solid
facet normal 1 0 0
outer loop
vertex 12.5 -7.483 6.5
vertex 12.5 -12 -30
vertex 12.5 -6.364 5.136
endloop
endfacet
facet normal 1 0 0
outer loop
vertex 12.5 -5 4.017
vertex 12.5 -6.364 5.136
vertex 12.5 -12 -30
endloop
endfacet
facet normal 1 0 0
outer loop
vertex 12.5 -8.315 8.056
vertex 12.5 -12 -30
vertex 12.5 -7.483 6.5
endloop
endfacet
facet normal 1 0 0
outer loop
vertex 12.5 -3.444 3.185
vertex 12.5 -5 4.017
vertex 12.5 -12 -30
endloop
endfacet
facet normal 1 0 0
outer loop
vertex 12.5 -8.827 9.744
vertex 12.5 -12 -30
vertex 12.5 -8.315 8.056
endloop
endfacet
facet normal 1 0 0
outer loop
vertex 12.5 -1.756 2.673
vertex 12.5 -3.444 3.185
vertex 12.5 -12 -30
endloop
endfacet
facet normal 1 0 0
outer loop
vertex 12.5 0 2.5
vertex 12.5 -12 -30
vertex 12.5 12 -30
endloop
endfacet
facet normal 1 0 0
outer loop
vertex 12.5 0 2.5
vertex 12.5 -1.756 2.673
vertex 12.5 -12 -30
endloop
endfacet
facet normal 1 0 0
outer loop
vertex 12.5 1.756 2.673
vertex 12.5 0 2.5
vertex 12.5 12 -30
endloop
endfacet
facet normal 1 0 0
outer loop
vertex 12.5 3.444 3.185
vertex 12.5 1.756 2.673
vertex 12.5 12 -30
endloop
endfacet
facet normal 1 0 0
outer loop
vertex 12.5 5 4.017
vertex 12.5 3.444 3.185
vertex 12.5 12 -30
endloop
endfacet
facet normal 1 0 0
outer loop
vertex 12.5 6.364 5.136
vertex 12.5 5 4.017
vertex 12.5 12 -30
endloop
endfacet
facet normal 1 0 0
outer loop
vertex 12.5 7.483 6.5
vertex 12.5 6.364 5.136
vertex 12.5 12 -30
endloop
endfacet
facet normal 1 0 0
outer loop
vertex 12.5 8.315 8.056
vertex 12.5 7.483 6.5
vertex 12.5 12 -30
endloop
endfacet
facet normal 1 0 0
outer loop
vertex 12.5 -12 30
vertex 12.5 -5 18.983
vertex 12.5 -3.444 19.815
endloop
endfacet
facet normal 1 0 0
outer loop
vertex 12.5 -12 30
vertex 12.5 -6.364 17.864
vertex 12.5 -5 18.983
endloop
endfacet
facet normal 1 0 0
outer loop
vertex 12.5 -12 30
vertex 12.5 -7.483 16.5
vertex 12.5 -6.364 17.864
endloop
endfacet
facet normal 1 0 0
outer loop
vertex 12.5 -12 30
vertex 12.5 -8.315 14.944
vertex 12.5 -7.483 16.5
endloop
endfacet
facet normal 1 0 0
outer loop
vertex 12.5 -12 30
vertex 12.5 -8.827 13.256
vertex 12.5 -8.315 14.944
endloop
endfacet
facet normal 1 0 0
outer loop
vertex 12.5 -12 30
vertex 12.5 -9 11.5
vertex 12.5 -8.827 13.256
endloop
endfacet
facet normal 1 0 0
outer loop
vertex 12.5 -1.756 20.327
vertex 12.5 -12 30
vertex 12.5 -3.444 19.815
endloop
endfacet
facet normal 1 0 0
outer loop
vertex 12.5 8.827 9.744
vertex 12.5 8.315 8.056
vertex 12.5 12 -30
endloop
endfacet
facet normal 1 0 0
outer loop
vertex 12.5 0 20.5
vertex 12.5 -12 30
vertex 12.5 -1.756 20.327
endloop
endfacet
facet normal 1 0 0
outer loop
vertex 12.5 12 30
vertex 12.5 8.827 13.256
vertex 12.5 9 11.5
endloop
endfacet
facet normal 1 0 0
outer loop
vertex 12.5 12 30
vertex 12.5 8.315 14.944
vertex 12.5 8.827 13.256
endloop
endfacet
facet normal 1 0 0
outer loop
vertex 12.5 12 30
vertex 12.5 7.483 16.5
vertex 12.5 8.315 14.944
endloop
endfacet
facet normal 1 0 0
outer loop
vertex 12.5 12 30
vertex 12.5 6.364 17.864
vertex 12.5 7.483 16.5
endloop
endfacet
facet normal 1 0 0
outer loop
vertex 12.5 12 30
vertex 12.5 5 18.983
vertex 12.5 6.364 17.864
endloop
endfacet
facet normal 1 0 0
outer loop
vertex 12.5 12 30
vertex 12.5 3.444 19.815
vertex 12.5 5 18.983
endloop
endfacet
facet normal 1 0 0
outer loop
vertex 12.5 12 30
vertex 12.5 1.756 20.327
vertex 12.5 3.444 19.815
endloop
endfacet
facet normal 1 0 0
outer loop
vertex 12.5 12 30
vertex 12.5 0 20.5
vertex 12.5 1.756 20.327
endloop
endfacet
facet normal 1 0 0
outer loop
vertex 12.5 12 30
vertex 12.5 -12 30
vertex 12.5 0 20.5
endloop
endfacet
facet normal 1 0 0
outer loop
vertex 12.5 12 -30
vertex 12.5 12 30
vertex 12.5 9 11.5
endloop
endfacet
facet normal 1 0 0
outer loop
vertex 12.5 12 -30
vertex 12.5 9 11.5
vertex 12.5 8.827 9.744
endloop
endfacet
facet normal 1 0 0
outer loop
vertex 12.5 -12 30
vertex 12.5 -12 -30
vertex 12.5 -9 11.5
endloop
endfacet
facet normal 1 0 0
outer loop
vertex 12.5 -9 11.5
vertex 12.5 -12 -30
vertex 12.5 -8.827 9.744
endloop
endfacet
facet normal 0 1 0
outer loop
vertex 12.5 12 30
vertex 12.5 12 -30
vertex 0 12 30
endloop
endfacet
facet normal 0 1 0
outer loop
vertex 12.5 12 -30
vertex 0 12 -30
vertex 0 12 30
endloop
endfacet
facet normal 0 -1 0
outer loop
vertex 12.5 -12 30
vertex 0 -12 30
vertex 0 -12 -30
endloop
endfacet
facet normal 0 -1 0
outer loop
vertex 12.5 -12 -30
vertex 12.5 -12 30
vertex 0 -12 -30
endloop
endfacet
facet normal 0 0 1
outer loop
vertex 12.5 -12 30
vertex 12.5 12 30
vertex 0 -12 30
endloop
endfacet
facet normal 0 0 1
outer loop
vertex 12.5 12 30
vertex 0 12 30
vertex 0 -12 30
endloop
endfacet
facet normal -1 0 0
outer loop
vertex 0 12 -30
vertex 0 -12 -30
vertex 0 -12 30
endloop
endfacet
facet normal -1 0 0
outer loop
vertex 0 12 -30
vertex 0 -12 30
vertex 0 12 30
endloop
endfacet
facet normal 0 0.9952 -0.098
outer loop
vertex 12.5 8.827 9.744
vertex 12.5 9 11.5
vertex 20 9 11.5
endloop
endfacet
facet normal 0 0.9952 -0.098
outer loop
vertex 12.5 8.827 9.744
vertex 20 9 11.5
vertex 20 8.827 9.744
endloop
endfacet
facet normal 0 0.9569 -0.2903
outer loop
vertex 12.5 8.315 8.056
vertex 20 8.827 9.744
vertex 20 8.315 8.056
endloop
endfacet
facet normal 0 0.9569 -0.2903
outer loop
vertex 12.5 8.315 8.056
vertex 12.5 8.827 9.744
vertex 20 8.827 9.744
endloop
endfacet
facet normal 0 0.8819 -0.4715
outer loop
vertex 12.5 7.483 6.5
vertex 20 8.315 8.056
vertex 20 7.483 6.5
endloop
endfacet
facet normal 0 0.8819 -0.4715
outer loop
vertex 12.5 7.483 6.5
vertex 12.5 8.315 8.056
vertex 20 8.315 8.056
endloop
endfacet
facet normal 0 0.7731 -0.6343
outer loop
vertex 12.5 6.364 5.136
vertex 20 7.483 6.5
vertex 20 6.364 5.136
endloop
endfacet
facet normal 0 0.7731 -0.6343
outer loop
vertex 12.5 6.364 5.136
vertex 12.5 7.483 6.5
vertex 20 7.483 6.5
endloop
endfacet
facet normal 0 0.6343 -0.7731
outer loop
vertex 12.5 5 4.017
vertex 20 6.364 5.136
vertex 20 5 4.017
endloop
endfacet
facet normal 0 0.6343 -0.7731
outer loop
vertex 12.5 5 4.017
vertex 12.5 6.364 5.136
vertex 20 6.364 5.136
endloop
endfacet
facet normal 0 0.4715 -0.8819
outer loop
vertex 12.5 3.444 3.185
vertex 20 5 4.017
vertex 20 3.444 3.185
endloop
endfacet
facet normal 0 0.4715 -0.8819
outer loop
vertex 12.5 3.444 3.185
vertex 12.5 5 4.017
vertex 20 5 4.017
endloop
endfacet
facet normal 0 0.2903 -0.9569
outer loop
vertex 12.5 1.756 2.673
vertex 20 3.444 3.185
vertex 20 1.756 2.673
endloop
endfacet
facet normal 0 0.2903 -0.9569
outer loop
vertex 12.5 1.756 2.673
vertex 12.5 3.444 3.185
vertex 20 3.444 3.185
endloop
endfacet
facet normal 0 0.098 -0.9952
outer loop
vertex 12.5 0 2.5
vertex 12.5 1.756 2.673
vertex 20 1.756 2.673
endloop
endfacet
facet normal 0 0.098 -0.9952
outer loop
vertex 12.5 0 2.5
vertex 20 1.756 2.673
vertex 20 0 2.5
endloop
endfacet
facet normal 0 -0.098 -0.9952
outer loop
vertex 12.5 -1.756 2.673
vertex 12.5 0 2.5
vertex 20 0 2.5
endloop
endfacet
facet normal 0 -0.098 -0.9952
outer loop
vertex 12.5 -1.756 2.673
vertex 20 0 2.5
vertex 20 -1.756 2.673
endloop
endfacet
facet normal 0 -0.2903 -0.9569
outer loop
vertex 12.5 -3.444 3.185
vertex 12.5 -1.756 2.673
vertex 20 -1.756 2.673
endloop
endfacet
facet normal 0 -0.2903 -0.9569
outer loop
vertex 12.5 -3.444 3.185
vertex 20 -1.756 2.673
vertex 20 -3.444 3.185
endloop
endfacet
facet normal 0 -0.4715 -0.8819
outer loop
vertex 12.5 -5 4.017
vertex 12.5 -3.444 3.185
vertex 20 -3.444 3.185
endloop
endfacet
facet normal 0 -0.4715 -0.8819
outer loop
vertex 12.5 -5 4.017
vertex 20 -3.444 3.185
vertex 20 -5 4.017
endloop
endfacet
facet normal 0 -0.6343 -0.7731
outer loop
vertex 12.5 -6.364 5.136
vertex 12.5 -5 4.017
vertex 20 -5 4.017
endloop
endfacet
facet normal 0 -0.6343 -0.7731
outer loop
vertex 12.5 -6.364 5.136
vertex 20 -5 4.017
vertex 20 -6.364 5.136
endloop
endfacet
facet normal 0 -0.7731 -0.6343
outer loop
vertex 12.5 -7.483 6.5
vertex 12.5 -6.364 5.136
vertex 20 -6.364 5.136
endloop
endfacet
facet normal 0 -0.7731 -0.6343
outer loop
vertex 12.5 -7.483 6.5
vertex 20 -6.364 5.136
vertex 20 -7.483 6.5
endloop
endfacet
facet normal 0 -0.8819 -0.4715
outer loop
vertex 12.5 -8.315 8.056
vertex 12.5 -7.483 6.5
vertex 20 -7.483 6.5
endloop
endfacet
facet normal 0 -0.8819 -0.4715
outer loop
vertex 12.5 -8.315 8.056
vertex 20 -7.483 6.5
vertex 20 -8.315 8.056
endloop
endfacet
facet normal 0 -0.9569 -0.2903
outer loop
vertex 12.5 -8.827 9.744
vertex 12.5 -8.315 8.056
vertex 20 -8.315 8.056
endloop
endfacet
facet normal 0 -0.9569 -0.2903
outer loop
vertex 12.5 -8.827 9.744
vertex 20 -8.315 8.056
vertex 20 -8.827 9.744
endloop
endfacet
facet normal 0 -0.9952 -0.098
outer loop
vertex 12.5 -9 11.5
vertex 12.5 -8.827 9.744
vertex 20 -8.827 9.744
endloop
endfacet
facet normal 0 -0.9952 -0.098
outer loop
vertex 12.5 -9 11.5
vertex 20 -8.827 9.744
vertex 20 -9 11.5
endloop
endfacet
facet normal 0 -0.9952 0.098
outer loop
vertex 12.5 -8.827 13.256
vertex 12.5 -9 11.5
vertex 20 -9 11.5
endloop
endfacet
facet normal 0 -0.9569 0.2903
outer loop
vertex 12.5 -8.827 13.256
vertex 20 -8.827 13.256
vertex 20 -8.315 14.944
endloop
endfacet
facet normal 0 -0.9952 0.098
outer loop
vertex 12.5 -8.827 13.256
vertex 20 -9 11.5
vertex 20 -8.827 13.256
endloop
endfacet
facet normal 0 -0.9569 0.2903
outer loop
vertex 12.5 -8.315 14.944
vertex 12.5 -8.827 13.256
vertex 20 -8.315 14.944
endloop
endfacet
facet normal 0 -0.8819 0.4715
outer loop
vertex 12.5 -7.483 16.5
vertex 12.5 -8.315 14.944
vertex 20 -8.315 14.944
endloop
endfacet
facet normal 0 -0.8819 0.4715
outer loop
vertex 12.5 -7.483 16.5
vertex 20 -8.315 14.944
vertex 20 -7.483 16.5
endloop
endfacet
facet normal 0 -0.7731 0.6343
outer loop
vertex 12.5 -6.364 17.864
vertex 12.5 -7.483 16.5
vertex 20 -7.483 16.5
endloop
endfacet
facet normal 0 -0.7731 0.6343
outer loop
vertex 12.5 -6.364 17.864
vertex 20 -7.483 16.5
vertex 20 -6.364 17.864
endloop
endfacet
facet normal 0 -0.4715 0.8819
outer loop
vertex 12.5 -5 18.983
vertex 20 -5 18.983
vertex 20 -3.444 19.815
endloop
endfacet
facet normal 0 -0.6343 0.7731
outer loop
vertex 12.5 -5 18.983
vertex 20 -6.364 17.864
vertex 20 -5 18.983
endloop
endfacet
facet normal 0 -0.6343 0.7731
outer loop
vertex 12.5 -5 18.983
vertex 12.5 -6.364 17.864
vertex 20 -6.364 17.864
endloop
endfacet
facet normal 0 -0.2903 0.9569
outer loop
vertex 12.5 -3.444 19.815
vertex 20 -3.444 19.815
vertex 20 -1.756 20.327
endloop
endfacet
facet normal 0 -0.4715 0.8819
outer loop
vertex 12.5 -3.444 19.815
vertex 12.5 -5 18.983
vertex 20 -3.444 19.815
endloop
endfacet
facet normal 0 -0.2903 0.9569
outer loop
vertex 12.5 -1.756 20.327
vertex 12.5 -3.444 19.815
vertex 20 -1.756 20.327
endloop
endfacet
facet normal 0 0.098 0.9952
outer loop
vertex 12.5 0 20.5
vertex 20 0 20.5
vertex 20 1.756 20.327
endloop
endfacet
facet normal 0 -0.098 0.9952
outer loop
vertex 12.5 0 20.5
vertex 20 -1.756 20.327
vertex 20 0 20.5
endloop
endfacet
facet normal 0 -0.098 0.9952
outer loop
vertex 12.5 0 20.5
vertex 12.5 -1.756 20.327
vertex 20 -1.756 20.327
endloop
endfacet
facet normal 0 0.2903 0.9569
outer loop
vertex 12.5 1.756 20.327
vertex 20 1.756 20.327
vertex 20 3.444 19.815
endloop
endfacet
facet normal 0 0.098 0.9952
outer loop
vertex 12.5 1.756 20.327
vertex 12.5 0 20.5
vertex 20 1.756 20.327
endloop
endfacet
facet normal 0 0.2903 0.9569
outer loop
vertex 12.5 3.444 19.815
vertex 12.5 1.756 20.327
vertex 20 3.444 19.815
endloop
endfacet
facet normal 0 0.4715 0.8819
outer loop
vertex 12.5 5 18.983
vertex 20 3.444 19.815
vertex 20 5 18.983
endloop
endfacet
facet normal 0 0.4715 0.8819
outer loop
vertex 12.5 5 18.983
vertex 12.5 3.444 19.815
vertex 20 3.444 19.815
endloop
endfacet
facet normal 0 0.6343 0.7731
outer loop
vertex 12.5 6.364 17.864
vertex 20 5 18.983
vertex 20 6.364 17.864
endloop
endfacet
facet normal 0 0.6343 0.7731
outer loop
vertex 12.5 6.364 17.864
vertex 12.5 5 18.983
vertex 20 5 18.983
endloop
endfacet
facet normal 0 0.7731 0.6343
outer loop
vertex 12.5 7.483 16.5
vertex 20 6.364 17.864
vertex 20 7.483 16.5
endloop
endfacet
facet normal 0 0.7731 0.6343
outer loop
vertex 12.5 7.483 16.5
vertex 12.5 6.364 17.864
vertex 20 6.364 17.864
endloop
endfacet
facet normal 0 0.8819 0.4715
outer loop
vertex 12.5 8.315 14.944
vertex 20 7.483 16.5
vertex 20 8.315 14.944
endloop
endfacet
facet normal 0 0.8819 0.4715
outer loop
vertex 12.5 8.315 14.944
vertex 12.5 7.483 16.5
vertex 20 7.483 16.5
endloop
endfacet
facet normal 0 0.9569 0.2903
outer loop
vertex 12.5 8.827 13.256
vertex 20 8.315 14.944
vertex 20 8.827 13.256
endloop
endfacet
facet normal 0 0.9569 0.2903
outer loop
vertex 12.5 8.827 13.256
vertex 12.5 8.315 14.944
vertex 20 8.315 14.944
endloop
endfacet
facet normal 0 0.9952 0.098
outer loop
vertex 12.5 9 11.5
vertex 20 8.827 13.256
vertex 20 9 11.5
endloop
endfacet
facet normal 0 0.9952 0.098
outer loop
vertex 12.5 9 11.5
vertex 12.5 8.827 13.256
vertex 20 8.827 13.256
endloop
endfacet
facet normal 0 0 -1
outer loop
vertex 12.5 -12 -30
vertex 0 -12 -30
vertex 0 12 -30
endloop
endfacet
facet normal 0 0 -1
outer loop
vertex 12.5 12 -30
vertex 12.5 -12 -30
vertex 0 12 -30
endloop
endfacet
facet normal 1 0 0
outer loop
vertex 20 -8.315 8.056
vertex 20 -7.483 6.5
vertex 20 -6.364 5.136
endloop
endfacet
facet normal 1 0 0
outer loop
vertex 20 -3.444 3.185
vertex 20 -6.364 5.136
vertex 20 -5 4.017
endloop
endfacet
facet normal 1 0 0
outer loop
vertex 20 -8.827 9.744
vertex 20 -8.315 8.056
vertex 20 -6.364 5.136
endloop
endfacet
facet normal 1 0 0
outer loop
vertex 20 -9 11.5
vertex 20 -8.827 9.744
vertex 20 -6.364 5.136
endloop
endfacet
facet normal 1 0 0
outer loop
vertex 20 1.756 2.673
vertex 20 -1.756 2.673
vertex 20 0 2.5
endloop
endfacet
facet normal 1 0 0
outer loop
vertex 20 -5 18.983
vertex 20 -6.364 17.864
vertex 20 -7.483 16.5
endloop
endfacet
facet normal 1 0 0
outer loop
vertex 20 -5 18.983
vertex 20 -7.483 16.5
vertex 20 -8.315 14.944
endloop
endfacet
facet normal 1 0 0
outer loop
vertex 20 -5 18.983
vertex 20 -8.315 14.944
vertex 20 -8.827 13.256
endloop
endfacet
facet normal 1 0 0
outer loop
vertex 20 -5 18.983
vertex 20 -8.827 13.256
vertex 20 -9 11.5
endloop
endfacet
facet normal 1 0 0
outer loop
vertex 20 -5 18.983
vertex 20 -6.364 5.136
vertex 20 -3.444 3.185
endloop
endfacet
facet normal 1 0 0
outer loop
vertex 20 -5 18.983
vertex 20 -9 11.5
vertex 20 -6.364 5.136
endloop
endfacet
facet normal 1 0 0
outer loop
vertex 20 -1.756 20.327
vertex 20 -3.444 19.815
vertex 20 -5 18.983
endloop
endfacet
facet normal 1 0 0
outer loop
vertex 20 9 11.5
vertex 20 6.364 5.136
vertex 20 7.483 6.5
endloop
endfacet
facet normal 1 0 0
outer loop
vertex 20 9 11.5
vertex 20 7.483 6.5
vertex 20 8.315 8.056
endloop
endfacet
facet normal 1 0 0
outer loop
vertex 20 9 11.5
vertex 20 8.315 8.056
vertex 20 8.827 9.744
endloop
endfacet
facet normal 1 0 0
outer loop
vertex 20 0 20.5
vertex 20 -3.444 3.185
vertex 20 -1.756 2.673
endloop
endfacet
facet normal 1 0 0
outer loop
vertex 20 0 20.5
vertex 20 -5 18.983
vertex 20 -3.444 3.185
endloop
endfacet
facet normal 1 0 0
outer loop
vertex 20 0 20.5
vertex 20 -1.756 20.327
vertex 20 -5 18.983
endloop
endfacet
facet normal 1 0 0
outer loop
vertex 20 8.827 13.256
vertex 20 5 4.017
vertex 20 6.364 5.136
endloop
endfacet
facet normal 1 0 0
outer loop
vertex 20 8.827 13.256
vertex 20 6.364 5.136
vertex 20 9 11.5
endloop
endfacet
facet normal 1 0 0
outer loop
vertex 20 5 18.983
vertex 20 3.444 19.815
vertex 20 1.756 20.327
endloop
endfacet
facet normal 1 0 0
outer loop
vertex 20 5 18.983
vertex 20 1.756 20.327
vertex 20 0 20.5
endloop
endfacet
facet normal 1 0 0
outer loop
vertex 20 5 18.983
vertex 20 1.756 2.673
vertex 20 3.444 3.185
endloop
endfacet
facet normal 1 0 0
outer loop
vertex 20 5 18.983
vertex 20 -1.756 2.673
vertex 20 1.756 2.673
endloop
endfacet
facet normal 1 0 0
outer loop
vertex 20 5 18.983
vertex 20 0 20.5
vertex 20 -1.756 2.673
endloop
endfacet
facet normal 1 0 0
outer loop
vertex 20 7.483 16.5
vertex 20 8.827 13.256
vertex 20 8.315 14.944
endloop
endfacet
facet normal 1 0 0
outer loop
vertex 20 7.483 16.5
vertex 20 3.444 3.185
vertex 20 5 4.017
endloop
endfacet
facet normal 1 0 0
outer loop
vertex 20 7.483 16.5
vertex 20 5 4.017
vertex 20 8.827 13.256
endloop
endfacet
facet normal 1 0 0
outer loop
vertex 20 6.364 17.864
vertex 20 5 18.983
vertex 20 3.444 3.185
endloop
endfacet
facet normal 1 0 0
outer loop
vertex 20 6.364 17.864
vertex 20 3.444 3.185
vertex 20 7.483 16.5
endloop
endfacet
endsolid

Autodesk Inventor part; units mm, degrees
ref_plane "YZ Plane" through (0, 0, 0) normal (1, 0, 0) x (0, 1, 0)
ref_plane "XZ Plane" through (0, 0, 0) normal (0, 1, 0) x (-1, 0, 0)
ref_plane "XY Plane" through (0, 0, 0) normal (0, 0, 1) x (1, 0, 0)
sketch "Boceto1" plane through (0, 0, 0) normal (1, 0, 0) x (0, 1, 0)
  line L0 (12, 30) -> (-12, 30)
  line L1 (-12, 30) -> (-12, -30)
  line L2 (-12, -30) -> (12, -30)
  line L3 (12, -30) -> (12, 30)
  circle A0 centre (0, 11.5) radius 9
  point P0 (0, 0)
  point P1 (12, 0)
  point P2 (0, -30)
  dimension "d0" = 60
  dimension "d1" = 24
  dimension "d2" = 18
  dimension "d3" = 18.5
extrude "Extrusión1" add sketch "Boceto1" along normal blind 20 contours A0
extrude "Extrusión2" add sketch "Boceto1" along normal blind 12.5
properties part number "Cámara"
